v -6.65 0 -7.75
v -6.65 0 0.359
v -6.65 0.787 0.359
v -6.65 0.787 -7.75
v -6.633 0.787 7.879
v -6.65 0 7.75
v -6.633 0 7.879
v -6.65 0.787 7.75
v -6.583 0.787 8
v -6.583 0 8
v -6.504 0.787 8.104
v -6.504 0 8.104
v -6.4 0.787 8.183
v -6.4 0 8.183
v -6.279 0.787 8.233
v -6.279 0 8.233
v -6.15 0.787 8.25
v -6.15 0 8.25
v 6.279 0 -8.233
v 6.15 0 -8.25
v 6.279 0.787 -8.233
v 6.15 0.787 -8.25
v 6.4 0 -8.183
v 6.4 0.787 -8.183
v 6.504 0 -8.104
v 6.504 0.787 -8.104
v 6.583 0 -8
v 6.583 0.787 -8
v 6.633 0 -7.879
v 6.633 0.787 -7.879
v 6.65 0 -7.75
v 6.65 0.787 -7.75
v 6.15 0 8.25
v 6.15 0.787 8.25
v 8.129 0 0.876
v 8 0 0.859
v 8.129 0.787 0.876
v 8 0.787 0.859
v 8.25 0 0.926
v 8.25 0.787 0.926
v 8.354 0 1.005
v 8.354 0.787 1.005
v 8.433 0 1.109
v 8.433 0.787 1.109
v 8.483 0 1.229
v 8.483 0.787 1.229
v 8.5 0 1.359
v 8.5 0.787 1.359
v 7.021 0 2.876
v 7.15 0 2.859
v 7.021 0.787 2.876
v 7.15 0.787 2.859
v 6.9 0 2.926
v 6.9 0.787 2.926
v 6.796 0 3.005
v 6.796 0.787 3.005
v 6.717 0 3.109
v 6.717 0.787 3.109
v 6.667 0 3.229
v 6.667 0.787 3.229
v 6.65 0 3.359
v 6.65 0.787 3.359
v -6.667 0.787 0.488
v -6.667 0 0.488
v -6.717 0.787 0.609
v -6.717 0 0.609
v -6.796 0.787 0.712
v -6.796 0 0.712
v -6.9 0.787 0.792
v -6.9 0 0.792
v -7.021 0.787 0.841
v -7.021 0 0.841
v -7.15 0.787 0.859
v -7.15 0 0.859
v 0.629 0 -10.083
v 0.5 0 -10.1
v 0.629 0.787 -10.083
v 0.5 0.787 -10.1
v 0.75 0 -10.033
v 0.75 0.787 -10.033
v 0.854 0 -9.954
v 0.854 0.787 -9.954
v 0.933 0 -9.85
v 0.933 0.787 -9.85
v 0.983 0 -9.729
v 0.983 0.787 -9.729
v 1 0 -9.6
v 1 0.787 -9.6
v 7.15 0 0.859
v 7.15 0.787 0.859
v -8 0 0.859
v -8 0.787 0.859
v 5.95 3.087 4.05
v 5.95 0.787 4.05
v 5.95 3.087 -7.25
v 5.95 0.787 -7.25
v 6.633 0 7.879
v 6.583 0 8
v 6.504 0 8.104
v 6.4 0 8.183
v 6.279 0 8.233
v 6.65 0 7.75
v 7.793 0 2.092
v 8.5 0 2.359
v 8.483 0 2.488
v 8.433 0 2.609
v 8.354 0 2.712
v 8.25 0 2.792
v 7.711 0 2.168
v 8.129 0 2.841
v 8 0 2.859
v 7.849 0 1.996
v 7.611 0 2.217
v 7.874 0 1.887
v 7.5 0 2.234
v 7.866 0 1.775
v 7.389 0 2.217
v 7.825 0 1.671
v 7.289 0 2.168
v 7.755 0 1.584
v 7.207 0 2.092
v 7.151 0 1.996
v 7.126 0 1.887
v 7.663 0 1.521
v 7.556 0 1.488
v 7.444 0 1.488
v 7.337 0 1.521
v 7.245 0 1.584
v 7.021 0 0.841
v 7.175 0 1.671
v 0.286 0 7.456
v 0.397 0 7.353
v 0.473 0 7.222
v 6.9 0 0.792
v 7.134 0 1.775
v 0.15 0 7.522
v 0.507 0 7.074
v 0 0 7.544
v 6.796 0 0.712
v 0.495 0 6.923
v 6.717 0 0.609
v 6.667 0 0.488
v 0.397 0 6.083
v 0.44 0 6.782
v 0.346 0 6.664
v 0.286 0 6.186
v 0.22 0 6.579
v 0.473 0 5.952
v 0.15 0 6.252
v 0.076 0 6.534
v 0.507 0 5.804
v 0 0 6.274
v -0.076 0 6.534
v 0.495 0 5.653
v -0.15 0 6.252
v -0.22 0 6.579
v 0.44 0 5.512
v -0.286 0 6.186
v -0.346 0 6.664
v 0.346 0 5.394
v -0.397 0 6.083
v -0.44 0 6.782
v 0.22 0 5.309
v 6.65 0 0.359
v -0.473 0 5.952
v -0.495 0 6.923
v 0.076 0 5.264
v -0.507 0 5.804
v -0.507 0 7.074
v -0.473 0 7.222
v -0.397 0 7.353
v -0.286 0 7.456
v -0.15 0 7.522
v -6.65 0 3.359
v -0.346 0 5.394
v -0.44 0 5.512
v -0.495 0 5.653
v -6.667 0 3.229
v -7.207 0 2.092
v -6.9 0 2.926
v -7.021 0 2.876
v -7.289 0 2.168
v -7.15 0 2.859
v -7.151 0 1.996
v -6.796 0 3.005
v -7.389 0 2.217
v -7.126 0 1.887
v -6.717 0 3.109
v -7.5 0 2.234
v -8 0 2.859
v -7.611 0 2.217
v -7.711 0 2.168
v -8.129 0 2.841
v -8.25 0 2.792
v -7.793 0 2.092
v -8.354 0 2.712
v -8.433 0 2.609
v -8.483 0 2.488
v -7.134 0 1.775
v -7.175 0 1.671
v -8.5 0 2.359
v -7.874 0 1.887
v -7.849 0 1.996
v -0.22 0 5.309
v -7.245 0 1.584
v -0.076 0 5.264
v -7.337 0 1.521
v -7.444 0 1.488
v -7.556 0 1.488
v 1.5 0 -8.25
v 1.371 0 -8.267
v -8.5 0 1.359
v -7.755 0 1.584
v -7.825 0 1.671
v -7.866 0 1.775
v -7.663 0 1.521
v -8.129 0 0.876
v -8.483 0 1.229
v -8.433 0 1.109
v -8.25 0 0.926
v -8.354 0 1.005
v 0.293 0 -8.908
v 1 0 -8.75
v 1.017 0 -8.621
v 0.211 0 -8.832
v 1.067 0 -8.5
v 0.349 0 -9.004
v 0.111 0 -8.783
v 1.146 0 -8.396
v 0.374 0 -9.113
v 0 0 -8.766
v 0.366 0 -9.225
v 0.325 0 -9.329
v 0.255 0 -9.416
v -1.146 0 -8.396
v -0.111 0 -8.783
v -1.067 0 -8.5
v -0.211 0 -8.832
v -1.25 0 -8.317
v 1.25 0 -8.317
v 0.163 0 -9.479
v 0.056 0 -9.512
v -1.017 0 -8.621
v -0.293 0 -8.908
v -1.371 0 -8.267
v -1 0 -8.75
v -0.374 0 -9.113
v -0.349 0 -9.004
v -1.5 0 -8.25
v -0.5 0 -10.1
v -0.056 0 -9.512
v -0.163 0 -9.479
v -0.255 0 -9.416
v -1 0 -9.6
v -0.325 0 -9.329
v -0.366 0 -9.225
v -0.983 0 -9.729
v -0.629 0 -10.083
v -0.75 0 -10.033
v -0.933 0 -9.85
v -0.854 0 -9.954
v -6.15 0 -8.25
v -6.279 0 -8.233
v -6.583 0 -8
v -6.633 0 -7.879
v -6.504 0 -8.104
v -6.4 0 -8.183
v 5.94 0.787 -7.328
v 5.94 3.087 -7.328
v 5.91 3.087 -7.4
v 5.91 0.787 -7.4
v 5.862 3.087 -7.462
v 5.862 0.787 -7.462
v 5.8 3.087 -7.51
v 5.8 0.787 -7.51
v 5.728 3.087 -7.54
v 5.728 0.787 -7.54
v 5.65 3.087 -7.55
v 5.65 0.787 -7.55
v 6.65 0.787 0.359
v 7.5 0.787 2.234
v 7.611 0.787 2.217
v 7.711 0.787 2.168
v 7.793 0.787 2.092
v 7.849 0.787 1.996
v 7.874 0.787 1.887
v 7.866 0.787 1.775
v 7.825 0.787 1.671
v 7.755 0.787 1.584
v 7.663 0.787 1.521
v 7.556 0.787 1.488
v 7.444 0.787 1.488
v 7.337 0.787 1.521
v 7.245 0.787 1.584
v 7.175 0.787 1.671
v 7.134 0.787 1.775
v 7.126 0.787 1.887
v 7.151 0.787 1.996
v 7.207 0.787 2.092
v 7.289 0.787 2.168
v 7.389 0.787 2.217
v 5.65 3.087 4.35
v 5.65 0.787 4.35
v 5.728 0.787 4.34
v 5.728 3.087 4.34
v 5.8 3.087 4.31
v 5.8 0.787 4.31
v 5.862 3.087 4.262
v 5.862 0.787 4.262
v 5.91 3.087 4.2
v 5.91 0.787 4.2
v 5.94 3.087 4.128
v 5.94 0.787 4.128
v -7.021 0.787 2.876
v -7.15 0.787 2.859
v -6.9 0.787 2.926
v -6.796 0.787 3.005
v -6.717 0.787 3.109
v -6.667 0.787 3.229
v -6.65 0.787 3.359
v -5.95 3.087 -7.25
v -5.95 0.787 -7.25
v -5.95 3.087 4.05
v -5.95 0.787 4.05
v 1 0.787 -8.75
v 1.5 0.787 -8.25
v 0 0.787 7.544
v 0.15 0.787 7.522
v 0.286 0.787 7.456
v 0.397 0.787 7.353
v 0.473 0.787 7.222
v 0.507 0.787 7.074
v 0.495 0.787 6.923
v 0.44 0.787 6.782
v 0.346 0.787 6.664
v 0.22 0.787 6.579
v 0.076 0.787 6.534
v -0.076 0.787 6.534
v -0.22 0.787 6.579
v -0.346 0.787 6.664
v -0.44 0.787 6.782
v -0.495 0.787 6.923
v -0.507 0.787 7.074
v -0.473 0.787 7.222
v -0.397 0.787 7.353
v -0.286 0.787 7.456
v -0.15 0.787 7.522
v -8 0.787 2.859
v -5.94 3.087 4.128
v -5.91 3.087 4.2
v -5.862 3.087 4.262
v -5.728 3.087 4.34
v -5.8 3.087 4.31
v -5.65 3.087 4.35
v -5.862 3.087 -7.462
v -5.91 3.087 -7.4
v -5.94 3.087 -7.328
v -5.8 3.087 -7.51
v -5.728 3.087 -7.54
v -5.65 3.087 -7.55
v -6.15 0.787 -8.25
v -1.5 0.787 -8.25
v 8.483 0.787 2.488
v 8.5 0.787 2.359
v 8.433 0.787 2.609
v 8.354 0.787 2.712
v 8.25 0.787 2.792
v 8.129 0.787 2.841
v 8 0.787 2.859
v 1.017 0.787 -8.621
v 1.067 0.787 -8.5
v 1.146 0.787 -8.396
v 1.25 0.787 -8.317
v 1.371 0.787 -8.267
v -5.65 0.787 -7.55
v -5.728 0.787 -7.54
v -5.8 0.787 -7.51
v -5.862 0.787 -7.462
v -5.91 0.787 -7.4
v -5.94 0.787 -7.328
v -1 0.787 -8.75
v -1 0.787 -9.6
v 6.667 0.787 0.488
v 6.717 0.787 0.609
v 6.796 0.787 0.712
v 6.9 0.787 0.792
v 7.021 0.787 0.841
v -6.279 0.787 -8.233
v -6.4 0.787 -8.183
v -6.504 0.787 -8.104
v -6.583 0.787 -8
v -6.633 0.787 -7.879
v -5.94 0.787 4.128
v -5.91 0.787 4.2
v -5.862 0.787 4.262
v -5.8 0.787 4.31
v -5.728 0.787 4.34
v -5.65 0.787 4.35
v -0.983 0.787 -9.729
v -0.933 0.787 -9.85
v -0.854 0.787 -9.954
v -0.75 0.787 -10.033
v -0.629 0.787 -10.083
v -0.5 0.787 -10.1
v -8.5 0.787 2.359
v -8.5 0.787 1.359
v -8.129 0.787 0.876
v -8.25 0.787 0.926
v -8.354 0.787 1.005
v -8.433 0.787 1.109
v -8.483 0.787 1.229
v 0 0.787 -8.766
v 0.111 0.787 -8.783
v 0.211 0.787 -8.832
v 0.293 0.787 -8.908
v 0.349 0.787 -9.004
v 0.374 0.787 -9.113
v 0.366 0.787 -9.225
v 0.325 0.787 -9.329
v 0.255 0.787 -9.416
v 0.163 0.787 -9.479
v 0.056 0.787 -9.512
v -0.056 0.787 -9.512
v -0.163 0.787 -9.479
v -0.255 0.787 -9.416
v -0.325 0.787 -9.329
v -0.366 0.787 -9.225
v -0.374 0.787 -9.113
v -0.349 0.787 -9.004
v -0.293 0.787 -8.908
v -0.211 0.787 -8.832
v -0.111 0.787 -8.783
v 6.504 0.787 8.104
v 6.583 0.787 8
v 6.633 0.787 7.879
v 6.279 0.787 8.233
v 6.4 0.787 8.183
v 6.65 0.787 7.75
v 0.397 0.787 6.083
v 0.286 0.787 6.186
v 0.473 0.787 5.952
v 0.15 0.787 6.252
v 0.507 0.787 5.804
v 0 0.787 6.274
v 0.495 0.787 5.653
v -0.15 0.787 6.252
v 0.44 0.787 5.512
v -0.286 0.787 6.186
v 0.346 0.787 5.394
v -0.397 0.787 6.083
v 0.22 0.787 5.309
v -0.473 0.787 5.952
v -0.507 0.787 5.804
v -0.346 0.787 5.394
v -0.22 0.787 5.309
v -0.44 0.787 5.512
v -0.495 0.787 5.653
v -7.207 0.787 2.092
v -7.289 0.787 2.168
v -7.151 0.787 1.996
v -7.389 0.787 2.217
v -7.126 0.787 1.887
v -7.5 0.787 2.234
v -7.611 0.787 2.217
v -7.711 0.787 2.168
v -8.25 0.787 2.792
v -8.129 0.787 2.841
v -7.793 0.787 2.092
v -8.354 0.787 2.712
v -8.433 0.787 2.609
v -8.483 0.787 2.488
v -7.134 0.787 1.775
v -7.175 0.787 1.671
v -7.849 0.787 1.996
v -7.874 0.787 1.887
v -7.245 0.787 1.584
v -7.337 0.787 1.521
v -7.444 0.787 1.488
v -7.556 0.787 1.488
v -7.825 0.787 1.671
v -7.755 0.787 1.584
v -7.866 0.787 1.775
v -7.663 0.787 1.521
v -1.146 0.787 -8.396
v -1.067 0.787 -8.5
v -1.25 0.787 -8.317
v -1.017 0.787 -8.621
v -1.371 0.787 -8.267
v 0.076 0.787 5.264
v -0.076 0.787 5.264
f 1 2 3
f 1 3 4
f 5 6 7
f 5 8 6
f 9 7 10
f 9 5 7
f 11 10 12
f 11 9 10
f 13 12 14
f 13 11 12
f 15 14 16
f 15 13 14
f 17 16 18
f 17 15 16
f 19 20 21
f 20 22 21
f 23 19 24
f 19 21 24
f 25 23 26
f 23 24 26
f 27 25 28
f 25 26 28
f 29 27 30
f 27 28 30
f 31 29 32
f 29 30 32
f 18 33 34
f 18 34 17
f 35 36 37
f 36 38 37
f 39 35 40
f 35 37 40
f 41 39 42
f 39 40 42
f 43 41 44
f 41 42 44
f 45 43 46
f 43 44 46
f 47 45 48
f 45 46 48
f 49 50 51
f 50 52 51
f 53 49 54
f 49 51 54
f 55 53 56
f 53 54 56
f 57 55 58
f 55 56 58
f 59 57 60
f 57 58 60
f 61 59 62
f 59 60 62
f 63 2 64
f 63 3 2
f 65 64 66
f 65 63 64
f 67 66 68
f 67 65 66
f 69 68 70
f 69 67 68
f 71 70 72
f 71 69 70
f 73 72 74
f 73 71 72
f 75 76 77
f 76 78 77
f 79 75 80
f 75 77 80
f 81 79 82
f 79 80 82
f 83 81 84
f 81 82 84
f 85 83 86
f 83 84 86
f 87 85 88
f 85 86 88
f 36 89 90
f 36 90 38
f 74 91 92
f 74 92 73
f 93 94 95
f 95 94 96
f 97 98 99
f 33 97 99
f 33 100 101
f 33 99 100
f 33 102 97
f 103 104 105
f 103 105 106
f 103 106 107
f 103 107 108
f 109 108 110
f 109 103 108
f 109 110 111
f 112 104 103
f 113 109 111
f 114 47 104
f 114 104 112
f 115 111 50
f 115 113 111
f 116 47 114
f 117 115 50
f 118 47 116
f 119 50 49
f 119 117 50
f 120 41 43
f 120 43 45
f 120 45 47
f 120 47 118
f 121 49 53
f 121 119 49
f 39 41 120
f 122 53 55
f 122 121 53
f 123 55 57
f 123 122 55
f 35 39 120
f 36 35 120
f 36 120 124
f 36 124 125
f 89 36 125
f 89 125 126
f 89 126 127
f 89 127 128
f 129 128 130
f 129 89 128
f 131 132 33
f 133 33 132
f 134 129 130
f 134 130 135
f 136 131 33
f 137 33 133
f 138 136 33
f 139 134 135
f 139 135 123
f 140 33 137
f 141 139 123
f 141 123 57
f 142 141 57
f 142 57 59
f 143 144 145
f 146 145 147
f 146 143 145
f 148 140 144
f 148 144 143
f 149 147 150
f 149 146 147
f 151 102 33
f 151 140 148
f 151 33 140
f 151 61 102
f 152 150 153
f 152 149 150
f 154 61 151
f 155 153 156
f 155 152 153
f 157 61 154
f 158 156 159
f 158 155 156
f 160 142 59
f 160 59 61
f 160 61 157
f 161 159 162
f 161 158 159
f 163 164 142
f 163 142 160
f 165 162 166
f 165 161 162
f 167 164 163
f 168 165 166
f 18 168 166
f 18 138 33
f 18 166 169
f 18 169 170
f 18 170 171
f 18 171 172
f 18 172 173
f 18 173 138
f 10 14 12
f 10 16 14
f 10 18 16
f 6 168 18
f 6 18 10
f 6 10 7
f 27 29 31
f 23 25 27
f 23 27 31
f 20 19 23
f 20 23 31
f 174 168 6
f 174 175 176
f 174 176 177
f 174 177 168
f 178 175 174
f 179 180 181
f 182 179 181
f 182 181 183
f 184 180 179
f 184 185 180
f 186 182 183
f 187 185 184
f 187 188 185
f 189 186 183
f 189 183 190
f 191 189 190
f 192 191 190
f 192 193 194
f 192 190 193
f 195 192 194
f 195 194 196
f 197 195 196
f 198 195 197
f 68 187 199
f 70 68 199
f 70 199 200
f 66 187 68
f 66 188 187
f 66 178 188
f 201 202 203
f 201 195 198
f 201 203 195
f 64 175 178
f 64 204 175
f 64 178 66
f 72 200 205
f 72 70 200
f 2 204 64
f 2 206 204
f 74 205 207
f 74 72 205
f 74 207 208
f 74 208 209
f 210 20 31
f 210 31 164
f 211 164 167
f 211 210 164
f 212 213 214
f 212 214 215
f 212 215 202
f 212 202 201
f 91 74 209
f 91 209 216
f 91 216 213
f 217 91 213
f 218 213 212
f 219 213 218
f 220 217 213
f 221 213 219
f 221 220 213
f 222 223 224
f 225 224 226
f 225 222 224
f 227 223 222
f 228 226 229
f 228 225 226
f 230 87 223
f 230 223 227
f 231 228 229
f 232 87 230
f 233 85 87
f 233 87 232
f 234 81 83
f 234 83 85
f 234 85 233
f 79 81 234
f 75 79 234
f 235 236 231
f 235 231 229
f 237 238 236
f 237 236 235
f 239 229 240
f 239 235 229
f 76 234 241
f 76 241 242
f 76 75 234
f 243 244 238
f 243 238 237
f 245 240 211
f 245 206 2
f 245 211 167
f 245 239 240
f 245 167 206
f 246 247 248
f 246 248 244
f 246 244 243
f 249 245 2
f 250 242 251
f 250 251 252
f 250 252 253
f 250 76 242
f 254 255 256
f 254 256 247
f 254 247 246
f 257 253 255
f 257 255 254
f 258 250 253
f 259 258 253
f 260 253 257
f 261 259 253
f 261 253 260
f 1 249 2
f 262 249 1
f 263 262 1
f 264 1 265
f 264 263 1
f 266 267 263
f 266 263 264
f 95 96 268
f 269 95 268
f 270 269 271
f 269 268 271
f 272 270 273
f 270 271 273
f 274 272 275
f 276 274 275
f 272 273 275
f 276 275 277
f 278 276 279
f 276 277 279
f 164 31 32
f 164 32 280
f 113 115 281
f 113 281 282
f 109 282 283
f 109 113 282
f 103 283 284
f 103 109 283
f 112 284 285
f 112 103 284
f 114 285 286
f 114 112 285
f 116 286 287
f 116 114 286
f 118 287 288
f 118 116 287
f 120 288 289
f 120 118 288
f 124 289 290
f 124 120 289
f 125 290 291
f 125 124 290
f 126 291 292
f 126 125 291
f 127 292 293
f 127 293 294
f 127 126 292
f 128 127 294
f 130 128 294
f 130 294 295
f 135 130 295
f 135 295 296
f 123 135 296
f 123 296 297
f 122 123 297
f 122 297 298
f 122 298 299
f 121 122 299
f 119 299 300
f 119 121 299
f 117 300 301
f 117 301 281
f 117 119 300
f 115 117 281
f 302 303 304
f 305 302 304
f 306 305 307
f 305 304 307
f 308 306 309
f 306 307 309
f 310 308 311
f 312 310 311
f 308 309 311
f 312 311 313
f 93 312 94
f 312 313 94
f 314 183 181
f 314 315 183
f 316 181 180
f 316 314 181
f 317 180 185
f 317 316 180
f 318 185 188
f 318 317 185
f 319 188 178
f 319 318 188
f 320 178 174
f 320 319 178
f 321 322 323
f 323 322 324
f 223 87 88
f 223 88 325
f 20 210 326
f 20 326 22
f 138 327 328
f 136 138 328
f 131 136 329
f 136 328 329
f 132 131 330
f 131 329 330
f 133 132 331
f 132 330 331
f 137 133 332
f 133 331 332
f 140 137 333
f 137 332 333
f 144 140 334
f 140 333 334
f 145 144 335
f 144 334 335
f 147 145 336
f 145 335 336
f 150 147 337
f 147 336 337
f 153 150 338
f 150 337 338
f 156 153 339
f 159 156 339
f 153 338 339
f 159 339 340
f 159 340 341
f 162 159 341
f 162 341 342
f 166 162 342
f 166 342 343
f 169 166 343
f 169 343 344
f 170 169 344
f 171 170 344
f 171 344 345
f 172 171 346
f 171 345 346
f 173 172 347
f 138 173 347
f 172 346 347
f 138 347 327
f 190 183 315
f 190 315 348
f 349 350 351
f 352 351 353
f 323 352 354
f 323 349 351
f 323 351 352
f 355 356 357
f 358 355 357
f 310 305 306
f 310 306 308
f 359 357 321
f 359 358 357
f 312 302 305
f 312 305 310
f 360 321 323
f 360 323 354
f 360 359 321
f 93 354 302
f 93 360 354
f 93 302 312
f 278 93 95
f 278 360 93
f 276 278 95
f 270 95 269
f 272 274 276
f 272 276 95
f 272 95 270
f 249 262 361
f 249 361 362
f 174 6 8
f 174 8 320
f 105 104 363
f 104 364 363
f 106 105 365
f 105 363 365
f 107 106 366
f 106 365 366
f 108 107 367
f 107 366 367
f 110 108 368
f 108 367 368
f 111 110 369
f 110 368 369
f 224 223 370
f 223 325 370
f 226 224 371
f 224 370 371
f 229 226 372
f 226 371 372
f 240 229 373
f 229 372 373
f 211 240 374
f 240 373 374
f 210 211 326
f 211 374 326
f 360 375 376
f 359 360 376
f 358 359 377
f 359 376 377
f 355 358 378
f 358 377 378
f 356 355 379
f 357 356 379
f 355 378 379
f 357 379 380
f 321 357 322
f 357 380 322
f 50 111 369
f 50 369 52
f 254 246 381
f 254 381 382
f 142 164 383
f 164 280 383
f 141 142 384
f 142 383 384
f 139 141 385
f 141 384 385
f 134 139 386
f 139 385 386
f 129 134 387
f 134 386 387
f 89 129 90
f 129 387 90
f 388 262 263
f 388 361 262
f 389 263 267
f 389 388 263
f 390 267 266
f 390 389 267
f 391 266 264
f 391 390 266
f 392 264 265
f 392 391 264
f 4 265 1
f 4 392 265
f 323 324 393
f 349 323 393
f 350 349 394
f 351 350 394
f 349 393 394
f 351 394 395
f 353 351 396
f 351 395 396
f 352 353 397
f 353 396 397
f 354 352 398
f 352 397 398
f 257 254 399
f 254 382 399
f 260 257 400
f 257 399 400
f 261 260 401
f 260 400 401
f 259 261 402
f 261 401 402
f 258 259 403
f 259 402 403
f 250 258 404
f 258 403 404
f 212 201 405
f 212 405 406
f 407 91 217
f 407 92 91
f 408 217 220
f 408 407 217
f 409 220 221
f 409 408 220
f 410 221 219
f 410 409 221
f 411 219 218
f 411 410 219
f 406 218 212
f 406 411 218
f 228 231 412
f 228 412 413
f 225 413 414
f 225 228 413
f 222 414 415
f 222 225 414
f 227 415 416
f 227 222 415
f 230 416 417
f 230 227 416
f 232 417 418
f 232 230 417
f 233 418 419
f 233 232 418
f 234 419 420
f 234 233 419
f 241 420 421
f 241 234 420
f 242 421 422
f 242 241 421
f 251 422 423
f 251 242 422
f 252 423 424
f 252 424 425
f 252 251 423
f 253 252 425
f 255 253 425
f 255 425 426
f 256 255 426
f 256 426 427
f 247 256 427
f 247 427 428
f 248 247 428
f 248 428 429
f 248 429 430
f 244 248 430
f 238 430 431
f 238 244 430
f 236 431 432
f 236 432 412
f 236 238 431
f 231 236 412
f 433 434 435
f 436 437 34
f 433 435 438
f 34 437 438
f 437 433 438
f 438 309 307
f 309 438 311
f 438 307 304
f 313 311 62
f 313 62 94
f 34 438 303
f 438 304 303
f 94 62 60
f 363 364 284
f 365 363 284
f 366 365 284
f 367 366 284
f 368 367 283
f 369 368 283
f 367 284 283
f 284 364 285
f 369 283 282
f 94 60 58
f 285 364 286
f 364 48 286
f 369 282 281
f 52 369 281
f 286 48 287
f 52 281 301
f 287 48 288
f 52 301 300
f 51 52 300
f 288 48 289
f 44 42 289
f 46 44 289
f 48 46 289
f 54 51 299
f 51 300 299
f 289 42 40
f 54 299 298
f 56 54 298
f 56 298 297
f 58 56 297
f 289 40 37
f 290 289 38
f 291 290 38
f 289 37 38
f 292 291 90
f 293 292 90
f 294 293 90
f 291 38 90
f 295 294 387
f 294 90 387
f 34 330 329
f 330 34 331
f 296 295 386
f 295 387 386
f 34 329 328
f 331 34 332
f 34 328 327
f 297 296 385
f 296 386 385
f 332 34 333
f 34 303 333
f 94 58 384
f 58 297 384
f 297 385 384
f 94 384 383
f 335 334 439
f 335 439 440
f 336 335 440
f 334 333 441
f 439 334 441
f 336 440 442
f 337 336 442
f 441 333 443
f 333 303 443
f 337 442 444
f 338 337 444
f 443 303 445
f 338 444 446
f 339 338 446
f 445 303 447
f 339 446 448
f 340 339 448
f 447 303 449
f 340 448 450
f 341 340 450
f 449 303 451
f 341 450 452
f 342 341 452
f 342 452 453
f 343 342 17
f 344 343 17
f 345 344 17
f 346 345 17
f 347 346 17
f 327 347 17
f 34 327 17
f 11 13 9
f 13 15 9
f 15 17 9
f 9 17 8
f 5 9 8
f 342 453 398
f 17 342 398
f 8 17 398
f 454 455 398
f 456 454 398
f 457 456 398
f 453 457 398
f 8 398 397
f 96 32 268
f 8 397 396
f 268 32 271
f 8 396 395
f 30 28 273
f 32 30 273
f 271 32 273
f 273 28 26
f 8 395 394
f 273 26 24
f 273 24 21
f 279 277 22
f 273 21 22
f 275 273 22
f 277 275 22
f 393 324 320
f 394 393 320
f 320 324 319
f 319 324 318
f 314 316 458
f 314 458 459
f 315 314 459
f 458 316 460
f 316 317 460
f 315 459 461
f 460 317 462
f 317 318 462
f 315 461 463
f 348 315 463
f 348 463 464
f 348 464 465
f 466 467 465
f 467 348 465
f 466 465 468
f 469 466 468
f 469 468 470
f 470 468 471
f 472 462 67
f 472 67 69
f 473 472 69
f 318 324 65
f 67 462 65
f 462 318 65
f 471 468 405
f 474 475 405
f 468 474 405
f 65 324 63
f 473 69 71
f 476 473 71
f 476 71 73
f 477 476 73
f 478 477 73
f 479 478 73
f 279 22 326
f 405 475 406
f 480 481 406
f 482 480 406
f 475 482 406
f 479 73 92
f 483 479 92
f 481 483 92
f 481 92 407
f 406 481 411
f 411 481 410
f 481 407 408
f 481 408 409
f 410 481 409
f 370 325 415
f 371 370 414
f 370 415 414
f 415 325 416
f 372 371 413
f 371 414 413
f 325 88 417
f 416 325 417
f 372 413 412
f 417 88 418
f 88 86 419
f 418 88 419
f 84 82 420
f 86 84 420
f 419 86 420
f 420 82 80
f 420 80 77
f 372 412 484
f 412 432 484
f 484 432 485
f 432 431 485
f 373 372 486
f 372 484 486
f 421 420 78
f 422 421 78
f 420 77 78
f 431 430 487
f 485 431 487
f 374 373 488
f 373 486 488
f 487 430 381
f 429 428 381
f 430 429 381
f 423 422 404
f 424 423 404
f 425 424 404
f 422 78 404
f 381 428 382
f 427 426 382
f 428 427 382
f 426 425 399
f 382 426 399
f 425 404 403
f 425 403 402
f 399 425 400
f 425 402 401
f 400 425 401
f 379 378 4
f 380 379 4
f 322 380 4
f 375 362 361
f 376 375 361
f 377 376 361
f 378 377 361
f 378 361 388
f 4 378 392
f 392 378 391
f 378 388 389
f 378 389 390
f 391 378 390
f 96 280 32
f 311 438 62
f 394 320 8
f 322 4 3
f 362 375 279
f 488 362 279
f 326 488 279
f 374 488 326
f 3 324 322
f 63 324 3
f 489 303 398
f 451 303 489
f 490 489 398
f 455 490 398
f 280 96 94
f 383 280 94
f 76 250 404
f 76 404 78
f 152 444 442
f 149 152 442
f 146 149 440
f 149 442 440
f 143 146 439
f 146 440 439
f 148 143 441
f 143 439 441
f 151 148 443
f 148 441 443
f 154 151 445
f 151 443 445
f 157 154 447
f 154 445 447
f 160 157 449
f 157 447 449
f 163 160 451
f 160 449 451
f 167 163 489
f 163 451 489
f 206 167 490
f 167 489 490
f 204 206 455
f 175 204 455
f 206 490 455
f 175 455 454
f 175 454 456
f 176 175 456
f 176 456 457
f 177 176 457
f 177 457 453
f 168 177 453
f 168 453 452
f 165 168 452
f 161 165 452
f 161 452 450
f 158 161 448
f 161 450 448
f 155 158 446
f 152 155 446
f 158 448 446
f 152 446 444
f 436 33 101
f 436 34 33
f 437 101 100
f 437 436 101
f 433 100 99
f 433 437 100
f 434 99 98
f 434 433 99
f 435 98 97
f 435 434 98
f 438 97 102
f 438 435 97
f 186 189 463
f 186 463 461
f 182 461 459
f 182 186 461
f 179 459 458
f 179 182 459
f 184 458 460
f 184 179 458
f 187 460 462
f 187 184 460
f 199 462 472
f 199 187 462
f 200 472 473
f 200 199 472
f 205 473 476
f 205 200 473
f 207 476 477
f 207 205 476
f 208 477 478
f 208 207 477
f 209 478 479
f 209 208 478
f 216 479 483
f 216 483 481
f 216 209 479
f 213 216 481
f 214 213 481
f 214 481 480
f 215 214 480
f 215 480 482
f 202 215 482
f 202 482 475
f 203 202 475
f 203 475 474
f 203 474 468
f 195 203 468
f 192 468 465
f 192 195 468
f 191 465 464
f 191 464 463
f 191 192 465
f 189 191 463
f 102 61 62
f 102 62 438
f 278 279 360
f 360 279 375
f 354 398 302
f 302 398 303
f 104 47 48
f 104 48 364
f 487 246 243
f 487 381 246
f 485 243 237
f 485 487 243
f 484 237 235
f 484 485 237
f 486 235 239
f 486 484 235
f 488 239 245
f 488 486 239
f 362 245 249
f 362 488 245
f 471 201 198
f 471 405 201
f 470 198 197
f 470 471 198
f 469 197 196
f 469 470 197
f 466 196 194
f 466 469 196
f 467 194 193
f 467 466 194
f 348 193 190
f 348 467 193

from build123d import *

# Parameters (mm, degrees)
SKETCH1_R           = 0.375
BOSS_EXTRUDE1_DEPTH = 0.7874
BOSS_EXTRUDE2_DEPTH = 2.3
FILLET1_R           = 0.5
SKETCH3_R           = 0.508
CUT_EXTRUDE1_DEPTH  = 0.7874


with BuildPart() as part:
    # Sketch1 → Boss-Extrude1 (new body)
    with BuildSketch(Plane(origin=(0, 0, 0), x_dir=(1, 0, 0), z_dir=(0, 1, 0))):
        Polygon((-1, 8.25), (-1, 10.1), (1, 10.1), (1, 8.25), (6.65, 8.25), (6.65, -0.858517924), (8.5, -0.858517924), (8.5, -2.858517924), (6.65, -2.858517924), (6.65, -8.25), (-6.65, -8.25), (-6.65, -2.858517924), (-8.5, -2.858517924), (-8.5, -0.858517924), (-6.65, -0.858517924), (-6.65, 8.25), align=None)
        with Locations(Location((-7.5, -1.858517924, 0), (0, 0, 270))):
            Circle(SKETCH1_R, mode=Mode.SUBTRACT)
        with Locations(Location((7.5, -1.858517924, 0), (0, 0, 270))):
            Circle(SKETCH1_R, mode=Mode.SUBTRACT)
        with Locations(Location((0, 9.141482076, 0), (0, 0, 270))):
            Circle(SKETCH1_R, mode=Mode.SUBTRACT)
    extrude(amount=BOSS_EXTRUDE1_DEPTH)

    # Sketch2 → Boss-Extrude2 (add)
    with BuildSketch(Plane(origin=(0, 0.7874, 0), x_dir=(1, 0, 0), z_dir=(0, 1, 0))):
        with BuildLine():
            Line((5.65, 7.55), (-5.65, 7.55))
            ThreePointArc((-5.65, 7.55), (-5.862132034, 7.462132034), (-5.95, 7.25))
            Line((-5.95, 7.25), (-5.95, -4.05))
            ThreePointArc((-5.95, -4.05), (-5.862132034, -4.262132034), (-5.65, -4.35))
            Line((-5.65, -4.35), (5.65, -4.35))
            ThreePointArc((5.65, -4.35), (5.862132034, -4.262132034), (5.95, -4.05))
            Line((5.95, -4.05), (5.95, 7.25))
            ThreePointArc((5.95, 7.25), (5.862132034, 7.462132034), (5.65, 7.55))
        make_face()
    extrude(amount=BOSS_EXTRUDE2_DEPTH)

    # Fillet1
    fillet1_edges = [part.edges().sort_by_distance(p)[0] for p in [
        (-6.65, 0.3937, 2.858517924),
        (-8.5, 0.3937, 2.858517924),
        (-8.5, 0.3937, 0.858517924),
        (-6.65, 0.3937, 0.858517924),
        (-6.65, 0.3937, -8.25),
        (-1, 0.3937, -8.25),
        (-1, 0.3937, -10.1),
        (1, 0.3937, -10.1),
        (1, 0.3937, -8.25),
        (6.65, 0.3937, -8.25),
        (6.65, 0.3937, 0.858517924),
        (8.5, 0.3937, 0.858517924),
        (8.5, 0.3937, 2.858517924),
        (6.65, 0.3937, 2.858517924),
        (6.65, 0.3937, 8.25),
        (-6.65, 0.3937, 8.25),
    ]]
    fillet(fillet1_edges, radius=FILLET1_R)

    # Sketch3 → Cut-Extrude1 (cut)
    with BuildSketch(Plane(origin=(0, 0.7874, 0), x_dir=(1, 0, 0), z_dir=(0, 1, 0))):
        with Locations(Location((0, -5.76619869, 0), (0, 0, 270))):
            Circle(SKETCH3_R)
        with Locations(Location((0, -7.03619869, 0), (0, 0, 270))):
            Circle(SKETCH3_R)
    extrude(amount=-CUT_EXTRUDE1_DEPTH, mode=Mode.SUBTRACT)


solid = part.part
